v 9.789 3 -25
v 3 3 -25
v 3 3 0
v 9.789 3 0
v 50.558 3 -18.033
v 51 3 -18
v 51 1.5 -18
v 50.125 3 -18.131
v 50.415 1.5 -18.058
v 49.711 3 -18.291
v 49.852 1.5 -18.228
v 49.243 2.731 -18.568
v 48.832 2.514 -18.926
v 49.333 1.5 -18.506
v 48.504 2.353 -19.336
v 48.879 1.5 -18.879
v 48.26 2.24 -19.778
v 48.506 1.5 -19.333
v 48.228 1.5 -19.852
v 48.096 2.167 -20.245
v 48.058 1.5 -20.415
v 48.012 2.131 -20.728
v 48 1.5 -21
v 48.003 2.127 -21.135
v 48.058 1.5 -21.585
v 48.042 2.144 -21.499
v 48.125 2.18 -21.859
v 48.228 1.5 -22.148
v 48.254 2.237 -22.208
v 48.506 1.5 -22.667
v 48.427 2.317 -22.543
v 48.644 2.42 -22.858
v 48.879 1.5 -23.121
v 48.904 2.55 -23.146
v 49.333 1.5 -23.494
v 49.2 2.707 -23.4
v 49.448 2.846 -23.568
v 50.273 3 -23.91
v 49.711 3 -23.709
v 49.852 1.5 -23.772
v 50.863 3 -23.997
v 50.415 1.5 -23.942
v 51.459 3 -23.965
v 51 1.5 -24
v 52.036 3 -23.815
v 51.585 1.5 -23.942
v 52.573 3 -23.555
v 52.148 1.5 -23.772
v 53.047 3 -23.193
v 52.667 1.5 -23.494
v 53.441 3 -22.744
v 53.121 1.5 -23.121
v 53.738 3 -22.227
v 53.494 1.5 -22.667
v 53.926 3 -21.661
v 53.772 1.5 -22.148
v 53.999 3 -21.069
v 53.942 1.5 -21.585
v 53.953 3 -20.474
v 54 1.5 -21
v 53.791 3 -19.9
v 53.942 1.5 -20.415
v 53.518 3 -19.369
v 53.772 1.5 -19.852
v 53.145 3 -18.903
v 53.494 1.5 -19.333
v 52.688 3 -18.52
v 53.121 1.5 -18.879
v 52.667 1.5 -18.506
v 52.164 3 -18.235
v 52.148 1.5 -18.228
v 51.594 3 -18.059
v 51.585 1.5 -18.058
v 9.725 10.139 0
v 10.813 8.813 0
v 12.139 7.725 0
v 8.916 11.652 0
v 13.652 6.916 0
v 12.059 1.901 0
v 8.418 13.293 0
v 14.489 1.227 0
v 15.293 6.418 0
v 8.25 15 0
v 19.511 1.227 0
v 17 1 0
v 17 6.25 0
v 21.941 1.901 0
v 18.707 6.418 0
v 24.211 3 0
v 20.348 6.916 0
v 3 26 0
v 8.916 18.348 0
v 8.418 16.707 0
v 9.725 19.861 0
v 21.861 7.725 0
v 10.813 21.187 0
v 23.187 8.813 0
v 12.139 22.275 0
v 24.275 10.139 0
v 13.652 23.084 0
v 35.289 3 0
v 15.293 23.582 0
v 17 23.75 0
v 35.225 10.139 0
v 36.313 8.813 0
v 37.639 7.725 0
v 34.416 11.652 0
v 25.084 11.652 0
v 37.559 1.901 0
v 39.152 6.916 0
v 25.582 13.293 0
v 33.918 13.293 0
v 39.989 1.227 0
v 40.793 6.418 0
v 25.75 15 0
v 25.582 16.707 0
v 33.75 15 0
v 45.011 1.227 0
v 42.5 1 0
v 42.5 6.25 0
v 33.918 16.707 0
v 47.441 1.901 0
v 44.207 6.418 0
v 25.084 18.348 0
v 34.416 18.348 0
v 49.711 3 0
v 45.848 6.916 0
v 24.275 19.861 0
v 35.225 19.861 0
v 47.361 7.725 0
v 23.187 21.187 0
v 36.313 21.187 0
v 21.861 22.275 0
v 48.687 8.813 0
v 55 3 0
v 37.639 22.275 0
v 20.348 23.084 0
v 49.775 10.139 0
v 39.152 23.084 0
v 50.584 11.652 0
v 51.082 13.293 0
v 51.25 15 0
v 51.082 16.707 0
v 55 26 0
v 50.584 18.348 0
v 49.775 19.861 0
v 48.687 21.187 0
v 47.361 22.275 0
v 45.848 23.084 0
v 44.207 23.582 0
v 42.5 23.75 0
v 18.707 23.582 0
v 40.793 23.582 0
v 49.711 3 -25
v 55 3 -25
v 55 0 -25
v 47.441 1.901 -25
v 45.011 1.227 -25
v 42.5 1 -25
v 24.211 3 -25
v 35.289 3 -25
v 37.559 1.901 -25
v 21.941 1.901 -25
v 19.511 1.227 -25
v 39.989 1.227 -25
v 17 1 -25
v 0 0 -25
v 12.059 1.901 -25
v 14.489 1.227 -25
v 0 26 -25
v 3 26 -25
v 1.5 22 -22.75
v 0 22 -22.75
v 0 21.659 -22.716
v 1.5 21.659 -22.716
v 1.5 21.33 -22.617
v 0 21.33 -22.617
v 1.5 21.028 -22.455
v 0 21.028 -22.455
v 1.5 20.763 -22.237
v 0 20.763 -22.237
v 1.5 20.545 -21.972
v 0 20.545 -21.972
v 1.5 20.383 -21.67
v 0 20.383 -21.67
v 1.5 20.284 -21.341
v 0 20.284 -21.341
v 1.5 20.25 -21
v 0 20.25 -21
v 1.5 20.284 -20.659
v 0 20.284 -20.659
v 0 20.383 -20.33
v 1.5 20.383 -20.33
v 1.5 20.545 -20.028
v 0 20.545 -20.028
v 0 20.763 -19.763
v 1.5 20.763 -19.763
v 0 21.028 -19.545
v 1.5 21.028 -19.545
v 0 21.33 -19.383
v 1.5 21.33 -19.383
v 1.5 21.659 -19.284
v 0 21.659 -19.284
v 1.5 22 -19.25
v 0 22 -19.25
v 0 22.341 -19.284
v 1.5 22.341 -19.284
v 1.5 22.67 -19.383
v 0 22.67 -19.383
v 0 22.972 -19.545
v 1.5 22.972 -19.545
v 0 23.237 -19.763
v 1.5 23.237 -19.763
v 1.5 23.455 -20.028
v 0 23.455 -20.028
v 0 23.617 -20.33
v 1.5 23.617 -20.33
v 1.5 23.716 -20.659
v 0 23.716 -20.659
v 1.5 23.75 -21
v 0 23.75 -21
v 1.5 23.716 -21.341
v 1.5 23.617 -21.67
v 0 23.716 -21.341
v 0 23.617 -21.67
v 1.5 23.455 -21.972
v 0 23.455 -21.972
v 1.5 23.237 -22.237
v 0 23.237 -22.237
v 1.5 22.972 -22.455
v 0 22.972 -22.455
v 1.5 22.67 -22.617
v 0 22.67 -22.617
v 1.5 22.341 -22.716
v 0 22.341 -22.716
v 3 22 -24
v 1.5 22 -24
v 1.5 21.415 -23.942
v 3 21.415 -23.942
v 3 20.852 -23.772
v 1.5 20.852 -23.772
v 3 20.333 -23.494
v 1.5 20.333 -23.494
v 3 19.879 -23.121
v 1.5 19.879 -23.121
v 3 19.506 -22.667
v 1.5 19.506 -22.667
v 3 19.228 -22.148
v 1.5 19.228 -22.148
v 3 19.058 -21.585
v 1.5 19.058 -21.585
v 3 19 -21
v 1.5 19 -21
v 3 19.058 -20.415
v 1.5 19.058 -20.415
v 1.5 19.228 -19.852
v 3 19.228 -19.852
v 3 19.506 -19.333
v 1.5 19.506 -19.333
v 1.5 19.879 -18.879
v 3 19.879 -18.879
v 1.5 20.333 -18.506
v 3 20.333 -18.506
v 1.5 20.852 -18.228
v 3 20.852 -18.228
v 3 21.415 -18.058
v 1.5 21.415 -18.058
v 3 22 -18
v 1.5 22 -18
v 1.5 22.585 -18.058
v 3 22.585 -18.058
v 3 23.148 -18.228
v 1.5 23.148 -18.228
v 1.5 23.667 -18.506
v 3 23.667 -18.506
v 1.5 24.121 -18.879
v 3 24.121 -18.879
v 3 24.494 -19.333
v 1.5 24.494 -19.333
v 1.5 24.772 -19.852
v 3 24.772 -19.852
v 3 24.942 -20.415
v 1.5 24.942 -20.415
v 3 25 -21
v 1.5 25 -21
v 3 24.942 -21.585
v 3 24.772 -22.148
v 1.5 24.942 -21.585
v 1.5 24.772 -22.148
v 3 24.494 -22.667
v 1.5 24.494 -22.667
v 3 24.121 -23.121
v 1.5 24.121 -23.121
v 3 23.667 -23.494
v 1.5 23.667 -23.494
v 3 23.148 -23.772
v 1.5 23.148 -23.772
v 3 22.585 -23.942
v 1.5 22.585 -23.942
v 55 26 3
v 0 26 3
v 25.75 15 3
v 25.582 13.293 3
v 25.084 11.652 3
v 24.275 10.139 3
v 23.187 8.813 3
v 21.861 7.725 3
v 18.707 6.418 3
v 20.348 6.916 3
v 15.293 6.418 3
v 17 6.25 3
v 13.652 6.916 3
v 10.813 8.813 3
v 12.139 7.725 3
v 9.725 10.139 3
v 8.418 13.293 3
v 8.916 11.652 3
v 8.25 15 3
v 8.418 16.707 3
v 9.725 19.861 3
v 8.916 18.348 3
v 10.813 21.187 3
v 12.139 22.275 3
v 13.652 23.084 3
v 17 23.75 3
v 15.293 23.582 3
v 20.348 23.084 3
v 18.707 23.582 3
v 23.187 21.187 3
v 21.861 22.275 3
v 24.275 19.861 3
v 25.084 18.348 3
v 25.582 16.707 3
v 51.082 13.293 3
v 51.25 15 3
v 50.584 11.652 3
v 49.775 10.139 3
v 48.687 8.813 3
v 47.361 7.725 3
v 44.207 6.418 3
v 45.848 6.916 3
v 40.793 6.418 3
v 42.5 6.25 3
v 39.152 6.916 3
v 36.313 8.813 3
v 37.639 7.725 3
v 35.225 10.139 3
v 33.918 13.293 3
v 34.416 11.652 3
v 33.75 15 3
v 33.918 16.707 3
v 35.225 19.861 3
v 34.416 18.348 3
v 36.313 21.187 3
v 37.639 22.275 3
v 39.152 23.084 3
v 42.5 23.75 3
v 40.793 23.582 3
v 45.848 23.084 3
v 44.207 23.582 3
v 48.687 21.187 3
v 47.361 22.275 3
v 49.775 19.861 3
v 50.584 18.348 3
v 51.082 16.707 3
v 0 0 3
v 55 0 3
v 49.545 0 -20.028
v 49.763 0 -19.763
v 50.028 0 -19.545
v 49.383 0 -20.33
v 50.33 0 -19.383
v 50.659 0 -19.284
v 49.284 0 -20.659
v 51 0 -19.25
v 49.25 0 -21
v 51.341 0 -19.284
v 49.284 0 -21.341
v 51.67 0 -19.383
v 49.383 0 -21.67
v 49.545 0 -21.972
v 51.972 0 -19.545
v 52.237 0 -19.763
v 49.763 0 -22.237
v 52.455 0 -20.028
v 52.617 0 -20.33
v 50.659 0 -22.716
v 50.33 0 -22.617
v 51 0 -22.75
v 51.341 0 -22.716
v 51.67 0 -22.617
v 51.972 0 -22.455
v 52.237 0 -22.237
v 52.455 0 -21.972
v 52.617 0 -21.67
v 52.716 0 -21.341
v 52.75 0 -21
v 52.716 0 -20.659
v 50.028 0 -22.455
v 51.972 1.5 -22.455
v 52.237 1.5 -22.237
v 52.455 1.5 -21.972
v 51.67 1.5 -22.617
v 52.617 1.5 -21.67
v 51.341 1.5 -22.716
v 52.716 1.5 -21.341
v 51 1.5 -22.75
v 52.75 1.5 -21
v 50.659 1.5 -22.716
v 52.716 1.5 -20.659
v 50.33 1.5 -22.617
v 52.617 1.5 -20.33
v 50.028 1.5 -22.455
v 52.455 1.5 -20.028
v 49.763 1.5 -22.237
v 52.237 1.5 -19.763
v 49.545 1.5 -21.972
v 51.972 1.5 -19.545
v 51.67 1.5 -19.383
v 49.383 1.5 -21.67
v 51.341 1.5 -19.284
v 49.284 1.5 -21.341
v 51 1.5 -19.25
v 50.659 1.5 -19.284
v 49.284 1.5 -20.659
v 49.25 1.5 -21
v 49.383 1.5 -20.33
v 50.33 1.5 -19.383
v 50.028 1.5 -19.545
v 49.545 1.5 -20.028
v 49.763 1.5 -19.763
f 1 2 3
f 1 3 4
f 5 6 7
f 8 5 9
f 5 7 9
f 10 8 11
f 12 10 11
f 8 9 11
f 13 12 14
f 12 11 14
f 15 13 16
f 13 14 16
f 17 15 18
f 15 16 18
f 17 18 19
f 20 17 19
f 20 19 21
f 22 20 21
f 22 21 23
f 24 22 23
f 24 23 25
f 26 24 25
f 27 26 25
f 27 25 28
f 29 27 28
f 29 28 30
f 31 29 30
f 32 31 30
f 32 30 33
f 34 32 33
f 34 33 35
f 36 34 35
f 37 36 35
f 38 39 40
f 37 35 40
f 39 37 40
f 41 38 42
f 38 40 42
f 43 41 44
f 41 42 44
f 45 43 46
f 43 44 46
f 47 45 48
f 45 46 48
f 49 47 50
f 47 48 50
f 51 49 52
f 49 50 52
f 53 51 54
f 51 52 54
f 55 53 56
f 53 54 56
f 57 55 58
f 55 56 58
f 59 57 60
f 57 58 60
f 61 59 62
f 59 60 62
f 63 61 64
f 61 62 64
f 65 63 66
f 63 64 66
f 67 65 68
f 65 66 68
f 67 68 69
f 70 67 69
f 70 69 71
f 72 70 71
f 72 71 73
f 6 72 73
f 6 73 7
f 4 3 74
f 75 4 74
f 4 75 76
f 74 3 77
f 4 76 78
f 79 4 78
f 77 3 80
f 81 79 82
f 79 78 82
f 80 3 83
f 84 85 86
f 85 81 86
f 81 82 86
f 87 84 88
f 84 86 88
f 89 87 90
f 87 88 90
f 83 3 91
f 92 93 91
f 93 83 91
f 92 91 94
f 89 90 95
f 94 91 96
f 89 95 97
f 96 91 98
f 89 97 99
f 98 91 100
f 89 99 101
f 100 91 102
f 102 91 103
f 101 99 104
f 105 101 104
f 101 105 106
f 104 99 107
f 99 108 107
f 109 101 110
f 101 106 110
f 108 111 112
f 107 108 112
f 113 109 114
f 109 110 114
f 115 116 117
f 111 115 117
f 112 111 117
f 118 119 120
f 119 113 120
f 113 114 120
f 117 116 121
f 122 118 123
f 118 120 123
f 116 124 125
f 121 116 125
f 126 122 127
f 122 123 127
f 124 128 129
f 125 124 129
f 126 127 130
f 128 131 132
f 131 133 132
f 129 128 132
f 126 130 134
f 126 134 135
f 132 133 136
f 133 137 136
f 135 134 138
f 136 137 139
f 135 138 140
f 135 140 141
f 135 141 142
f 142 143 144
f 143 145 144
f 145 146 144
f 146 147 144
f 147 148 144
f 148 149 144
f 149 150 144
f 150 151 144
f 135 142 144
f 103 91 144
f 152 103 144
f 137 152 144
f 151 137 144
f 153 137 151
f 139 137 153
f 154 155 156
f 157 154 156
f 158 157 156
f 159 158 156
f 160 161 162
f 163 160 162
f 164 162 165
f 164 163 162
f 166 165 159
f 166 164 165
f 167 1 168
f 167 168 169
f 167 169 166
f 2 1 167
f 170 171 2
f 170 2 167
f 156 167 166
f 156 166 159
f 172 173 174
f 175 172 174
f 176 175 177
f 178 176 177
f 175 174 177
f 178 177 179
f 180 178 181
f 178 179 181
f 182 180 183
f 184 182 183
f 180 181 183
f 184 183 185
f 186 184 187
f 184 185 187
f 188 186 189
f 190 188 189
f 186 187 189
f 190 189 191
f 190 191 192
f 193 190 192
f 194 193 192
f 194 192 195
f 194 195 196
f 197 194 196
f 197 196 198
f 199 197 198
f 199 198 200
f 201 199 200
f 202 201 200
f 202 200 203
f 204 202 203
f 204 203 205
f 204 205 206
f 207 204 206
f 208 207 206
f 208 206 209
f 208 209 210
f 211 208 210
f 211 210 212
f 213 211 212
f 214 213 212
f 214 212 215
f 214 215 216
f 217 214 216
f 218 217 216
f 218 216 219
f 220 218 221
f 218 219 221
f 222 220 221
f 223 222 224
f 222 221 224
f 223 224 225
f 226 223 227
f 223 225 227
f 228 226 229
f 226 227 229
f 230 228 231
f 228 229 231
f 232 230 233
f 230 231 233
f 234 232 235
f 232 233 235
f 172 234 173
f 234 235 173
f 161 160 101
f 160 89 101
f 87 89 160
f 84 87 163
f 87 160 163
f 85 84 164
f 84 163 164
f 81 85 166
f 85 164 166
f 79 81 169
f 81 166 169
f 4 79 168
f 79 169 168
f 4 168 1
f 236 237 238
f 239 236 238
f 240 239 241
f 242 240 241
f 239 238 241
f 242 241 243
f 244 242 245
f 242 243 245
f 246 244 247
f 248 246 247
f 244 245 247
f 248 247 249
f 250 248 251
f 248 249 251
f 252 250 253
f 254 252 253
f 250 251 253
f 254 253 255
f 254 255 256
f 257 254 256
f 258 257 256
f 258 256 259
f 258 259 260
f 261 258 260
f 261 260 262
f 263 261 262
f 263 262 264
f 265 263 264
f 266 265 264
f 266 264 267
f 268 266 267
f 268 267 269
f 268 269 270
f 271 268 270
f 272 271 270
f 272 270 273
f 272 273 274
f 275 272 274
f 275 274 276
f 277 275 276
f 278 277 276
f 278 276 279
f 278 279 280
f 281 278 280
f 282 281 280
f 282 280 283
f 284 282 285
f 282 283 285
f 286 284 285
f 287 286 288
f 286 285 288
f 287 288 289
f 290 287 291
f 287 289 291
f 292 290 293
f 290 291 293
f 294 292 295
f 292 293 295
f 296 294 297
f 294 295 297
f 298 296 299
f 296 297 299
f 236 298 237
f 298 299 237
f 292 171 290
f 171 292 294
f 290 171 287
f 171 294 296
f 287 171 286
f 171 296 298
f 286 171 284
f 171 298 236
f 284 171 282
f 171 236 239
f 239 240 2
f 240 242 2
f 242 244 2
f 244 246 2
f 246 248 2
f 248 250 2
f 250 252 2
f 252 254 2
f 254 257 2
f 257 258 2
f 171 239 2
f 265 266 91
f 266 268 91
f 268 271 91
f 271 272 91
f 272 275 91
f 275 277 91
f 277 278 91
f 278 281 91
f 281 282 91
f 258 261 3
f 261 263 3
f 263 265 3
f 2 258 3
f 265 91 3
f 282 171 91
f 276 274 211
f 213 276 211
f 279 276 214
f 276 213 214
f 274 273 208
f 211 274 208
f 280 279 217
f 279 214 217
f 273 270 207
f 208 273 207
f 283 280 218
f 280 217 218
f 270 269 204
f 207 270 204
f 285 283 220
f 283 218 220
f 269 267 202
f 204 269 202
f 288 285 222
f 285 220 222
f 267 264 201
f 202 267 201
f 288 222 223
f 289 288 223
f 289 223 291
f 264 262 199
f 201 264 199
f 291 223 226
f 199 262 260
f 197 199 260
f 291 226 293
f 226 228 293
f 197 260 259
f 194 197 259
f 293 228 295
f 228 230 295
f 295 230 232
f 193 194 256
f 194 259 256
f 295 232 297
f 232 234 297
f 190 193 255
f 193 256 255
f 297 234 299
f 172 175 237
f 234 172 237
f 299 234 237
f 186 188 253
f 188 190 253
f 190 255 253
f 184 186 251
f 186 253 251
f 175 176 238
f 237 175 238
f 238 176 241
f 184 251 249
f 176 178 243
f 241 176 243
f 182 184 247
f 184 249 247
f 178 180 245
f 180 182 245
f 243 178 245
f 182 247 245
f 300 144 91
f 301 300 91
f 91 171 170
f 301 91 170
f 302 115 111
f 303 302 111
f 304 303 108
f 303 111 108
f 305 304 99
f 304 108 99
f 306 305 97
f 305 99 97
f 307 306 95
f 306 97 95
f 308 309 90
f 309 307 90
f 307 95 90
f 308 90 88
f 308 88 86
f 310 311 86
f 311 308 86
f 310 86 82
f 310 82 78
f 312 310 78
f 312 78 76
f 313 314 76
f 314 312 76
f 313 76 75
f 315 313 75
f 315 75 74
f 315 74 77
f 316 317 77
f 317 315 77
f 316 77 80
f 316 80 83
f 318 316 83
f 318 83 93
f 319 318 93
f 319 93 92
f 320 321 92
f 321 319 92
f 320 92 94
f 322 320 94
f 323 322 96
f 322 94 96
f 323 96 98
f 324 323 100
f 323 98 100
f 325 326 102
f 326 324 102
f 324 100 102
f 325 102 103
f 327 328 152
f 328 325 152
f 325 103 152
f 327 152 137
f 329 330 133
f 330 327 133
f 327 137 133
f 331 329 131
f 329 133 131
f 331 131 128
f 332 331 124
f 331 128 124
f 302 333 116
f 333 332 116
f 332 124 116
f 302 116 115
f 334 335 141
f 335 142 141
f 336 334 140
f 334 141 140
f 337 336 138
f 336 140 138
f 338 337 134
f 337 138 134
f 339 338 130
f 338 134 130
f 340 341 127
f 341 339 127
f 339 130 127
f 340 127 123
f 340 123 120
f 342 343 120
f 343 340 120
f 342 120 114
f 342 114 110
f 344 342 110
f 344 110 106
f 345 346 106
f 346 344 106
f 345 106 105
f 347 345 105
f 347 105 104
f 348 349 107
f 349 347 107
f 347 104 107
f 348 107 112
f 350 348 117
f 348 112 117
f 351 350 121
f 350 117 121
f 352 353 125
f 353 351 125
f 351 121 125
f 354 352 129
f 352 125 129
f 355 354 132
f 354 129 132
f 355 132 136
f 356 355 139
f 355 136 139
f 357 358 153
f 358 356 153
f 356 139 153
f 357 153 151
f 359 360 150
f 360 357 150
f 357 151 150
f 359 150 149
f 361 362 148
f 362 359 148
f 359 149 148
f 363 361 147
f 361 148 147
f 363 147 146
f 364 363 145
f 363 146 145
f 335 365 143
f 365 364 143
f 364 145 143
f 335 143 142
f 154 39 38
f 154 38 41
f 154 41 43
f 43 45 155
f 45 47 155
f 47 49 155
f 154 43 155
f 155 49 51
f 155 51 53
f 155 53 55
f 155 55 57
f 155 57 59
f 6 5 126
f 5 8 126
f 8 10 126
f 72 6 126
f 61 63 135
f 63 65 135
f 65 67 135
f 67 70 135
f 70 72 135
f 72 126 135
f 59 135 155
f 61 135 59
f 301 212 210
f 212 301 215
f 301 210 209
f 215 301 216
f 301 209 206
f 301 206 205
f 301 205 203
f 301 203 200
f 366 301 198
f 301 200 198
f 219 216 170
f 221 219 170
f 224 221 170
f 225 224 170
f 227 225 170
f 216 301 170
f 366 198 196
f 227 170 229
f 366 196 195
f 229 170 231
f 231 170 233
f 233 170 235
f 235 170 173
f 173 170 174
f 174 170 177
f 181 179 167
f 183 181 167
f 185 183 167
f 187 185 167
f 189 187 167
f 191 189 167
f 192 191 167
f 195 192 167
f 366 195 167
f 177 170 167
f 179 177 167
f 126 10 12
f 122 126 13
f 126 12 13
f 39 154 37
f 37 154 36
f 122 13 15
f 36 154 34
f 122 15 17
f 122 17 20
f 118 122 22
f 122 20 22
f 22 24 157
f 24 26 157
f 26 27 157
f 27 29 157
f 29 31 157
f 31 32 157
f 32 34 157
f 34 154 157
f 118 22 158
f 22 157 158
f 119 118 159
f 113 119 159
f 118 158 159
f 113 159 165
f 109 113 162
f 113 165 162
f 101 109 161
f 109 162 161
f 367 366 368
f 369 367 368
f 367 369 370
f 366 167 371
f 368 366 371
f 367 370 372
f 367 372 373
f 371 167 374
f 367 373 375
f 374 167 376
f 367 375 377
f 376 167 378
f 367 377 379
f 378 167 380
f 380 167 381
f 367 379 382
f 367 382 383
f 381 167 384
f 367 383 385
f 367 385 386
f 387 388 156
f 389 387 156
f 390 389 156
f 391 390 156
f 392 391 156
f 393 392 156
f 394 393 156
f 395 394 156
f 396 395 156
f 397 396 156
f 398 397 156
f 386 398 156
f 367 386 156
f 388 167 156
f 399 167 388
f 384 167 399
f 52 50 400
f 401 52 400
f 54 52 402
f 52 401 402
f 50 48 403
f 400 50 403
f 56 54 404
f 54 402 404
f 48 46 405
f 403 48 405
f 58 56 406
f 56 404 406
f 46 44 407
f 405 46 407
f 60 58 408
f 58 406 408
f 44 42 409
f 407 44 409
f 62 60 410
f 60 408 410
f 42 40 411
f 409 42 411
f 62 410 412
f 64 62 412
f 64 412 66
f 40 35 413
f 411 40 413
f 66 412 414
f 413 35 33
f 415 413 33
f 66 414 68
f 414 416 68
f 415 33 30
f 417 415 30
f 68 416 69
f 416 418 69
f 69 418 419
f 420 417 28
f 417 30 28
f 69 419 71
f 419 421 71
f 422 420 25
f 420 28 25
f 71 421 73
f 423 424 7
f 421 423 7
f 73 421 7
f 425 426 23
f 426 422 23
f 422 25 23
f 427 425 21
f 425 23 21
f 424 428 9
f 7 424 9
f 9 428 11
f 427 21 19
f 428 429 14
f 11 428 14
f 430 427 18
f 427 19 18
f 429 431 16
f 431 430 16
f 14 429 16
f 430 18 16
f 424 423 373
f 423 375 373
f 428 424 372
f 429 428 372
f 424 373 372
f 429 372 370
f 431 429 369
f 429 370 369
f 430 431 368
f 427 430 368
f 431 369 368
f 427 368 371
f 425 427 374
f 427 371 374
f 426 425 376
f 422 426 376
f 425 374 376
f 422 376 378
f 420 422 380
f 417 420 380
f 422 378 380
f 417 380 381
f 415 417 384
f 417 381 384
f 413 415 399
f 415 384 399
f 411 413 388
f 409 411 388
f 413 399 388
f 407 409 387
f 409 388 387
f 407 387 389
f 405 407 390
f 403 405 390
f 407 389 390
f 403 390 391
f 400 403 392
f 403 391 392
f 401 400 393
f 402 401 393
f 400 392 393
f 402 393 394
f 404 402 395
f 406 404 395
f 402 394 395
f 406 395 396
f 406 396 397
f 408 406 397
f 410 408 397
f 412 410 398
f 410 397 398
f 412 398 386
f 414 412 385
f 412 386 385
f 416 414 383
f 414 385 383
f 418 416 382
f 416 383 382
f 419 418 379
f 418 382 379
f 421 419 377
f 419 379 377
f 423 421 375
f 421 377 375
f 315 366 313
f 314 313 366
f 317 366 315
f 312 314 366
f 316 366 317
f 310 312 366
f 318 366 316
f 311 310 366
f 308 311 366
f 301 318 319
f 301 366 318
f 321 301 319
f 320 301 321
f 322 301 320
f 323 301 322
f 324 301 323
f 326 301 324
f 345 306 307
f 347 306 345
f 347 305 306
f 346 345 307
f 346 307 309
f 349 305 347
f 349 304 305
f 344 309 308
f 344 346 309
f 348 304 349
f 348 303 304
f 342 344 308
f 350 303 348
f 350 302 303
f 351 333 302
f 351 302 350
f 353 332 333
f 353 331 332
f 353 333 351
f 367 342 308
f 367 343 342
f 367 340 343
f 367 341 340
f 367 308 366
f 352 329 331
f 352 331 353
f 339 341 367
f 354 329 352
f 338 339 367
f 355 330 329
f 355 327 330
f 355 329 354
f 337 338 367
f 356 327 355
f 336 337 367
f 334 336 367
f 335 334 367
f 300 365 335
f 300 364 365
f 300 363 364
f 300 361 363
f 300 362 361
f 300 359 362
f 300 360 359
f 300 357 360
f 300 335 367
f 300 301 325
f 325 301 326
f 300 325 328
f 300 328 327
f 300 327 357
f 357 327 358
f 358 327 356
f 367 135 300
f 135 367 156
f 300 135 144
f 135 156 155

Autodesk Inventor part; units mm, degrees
ref_plane "YZ Plane" through (0, 0, 0) normal (1, 0, 0) x (0, 1, 0)
ref_plane "XZ Plane" through (0, 0, 0) normal (0, 1, 0) x (-1, 0, 0)
ref_plane "XY Plane" through (0, 0, 0) normal (0, 0, 1) x (1, 0, 0)
sketch "Skizze1" plane through (0, 0, 0) normal (0, 0, 1) x (1, 0, 0)
  line L0 (0, 0) -> (55, 0)
  line L1 (55, 0) -> (55, 26)
  line L2 (55, 26) -> (0, 26)
  line L3 (0, 26) -> (0, 0)
  circle A0 centre (17, 15) radius 8.75
  circle A1 centre (42.5, 15) radius 8.75
  dimension "D" = 17.5
  dimension "d1" = 17.5
  dimension "Hoehe" = 26
  dimension "L" = 55
  dimension "d5" = 17
  dimension "d7" = 11
  dimension "d14" = 12.5
extrude "Extrusion1" add sketch "Skizze1" along normal blind 3
sketch "Skizze2" plane through (0, 0, 0) normal (0, 0, -1) x (-1, 0, 0)
  line L0 (-55, 0) -> (-55, 26) projected
  line L1 (0, 0) -> (-55, 0) projected
  line L2 (0, 26) -> (0, 0) projected
  line L3 (-55, 26) -> (0, 26) projected
  circle A0 centre (-17, 15) radius 8.75 projected
  circle A1 centre (-42.5, 15) radius 8.75 projected
  line L4 (-55, 26) -> (0, 26) projected
  line L5 (-3, 26) -> (-3, 3)
  line L6 (-3, 3) -> (-55, 3)
  dimension "Dicke" = 3
  dimension "d11" = 3
extrude "Extrusion2" add sketch "Skizze2" along normal blind 25 contours L0 L6 L5 L3 L2 L1
sketch "Skizze3" plane through (3, 3, 0) normal (0, 1, 0) x (1, 0, 0)
  line L0 (52, 0) -> (52, 25) projected
  line L1 (0, 25) -> (52, 25) projected
  point P0 (-3, 0)
  point P1 (48, 21)
  dimension "d22" = 4
  dimension "d23" = 4
hole "Bohrung1" at (51, 3, -21) direction (0, -1, 0) diameter 3.5 end through all counterbore diameter 6 counterbore depth 1.5
sketch "Skizze4" plane through (3, 3, 0) normal (1, 0, 0) x (0, 0, -1)
  line L0 (0, 23) -> (25, 23) projected
  line L1 (25, 23) -> (25, 0) projected
  point P0 (0, -3)
  point P1 (21, 19)
  dimension "d31" = 4
  dimension "d32" = 4
hole "Bohrung2" at (3, 22, -21) direction (-1, 0, 0) diameter 3.5 end through all counterbore diameter 6 counterbore depth 1.5
sketch "Skizze5" plane through (0, 0, -25) normal (0, 0, -1) x (-1, 0, 0)
  circle A0 centre (-42.5, 15) radius 8.75 projected
  circle A1 centre (-17, 15) radius 8.75 projected
  circle A2 centre (-42.5, 15) radius 14
  circle A3 centre (-17, 15) radius 14
  point P0 (0, 0)
  point P1 (-29.75, 9.2175)
  point P2 (-29.75, 20.7825)
  dimension "d33" = 28
  dimension "d34" = 28
extrude "Extrusion3" cut sketch "Skizze5" against normal blind 25 contours A2 A3 | A3 A2 picked at (-4.9763, 13.1615) picked at (-54.5237, 16.8385)
equation "\"d1\" = D"
equation "\"d11\" = Dicke"
equation "\"d23\" = d22"
equation "\"d34\" = d33"
properties part number "Buttons_Mount_v2"
